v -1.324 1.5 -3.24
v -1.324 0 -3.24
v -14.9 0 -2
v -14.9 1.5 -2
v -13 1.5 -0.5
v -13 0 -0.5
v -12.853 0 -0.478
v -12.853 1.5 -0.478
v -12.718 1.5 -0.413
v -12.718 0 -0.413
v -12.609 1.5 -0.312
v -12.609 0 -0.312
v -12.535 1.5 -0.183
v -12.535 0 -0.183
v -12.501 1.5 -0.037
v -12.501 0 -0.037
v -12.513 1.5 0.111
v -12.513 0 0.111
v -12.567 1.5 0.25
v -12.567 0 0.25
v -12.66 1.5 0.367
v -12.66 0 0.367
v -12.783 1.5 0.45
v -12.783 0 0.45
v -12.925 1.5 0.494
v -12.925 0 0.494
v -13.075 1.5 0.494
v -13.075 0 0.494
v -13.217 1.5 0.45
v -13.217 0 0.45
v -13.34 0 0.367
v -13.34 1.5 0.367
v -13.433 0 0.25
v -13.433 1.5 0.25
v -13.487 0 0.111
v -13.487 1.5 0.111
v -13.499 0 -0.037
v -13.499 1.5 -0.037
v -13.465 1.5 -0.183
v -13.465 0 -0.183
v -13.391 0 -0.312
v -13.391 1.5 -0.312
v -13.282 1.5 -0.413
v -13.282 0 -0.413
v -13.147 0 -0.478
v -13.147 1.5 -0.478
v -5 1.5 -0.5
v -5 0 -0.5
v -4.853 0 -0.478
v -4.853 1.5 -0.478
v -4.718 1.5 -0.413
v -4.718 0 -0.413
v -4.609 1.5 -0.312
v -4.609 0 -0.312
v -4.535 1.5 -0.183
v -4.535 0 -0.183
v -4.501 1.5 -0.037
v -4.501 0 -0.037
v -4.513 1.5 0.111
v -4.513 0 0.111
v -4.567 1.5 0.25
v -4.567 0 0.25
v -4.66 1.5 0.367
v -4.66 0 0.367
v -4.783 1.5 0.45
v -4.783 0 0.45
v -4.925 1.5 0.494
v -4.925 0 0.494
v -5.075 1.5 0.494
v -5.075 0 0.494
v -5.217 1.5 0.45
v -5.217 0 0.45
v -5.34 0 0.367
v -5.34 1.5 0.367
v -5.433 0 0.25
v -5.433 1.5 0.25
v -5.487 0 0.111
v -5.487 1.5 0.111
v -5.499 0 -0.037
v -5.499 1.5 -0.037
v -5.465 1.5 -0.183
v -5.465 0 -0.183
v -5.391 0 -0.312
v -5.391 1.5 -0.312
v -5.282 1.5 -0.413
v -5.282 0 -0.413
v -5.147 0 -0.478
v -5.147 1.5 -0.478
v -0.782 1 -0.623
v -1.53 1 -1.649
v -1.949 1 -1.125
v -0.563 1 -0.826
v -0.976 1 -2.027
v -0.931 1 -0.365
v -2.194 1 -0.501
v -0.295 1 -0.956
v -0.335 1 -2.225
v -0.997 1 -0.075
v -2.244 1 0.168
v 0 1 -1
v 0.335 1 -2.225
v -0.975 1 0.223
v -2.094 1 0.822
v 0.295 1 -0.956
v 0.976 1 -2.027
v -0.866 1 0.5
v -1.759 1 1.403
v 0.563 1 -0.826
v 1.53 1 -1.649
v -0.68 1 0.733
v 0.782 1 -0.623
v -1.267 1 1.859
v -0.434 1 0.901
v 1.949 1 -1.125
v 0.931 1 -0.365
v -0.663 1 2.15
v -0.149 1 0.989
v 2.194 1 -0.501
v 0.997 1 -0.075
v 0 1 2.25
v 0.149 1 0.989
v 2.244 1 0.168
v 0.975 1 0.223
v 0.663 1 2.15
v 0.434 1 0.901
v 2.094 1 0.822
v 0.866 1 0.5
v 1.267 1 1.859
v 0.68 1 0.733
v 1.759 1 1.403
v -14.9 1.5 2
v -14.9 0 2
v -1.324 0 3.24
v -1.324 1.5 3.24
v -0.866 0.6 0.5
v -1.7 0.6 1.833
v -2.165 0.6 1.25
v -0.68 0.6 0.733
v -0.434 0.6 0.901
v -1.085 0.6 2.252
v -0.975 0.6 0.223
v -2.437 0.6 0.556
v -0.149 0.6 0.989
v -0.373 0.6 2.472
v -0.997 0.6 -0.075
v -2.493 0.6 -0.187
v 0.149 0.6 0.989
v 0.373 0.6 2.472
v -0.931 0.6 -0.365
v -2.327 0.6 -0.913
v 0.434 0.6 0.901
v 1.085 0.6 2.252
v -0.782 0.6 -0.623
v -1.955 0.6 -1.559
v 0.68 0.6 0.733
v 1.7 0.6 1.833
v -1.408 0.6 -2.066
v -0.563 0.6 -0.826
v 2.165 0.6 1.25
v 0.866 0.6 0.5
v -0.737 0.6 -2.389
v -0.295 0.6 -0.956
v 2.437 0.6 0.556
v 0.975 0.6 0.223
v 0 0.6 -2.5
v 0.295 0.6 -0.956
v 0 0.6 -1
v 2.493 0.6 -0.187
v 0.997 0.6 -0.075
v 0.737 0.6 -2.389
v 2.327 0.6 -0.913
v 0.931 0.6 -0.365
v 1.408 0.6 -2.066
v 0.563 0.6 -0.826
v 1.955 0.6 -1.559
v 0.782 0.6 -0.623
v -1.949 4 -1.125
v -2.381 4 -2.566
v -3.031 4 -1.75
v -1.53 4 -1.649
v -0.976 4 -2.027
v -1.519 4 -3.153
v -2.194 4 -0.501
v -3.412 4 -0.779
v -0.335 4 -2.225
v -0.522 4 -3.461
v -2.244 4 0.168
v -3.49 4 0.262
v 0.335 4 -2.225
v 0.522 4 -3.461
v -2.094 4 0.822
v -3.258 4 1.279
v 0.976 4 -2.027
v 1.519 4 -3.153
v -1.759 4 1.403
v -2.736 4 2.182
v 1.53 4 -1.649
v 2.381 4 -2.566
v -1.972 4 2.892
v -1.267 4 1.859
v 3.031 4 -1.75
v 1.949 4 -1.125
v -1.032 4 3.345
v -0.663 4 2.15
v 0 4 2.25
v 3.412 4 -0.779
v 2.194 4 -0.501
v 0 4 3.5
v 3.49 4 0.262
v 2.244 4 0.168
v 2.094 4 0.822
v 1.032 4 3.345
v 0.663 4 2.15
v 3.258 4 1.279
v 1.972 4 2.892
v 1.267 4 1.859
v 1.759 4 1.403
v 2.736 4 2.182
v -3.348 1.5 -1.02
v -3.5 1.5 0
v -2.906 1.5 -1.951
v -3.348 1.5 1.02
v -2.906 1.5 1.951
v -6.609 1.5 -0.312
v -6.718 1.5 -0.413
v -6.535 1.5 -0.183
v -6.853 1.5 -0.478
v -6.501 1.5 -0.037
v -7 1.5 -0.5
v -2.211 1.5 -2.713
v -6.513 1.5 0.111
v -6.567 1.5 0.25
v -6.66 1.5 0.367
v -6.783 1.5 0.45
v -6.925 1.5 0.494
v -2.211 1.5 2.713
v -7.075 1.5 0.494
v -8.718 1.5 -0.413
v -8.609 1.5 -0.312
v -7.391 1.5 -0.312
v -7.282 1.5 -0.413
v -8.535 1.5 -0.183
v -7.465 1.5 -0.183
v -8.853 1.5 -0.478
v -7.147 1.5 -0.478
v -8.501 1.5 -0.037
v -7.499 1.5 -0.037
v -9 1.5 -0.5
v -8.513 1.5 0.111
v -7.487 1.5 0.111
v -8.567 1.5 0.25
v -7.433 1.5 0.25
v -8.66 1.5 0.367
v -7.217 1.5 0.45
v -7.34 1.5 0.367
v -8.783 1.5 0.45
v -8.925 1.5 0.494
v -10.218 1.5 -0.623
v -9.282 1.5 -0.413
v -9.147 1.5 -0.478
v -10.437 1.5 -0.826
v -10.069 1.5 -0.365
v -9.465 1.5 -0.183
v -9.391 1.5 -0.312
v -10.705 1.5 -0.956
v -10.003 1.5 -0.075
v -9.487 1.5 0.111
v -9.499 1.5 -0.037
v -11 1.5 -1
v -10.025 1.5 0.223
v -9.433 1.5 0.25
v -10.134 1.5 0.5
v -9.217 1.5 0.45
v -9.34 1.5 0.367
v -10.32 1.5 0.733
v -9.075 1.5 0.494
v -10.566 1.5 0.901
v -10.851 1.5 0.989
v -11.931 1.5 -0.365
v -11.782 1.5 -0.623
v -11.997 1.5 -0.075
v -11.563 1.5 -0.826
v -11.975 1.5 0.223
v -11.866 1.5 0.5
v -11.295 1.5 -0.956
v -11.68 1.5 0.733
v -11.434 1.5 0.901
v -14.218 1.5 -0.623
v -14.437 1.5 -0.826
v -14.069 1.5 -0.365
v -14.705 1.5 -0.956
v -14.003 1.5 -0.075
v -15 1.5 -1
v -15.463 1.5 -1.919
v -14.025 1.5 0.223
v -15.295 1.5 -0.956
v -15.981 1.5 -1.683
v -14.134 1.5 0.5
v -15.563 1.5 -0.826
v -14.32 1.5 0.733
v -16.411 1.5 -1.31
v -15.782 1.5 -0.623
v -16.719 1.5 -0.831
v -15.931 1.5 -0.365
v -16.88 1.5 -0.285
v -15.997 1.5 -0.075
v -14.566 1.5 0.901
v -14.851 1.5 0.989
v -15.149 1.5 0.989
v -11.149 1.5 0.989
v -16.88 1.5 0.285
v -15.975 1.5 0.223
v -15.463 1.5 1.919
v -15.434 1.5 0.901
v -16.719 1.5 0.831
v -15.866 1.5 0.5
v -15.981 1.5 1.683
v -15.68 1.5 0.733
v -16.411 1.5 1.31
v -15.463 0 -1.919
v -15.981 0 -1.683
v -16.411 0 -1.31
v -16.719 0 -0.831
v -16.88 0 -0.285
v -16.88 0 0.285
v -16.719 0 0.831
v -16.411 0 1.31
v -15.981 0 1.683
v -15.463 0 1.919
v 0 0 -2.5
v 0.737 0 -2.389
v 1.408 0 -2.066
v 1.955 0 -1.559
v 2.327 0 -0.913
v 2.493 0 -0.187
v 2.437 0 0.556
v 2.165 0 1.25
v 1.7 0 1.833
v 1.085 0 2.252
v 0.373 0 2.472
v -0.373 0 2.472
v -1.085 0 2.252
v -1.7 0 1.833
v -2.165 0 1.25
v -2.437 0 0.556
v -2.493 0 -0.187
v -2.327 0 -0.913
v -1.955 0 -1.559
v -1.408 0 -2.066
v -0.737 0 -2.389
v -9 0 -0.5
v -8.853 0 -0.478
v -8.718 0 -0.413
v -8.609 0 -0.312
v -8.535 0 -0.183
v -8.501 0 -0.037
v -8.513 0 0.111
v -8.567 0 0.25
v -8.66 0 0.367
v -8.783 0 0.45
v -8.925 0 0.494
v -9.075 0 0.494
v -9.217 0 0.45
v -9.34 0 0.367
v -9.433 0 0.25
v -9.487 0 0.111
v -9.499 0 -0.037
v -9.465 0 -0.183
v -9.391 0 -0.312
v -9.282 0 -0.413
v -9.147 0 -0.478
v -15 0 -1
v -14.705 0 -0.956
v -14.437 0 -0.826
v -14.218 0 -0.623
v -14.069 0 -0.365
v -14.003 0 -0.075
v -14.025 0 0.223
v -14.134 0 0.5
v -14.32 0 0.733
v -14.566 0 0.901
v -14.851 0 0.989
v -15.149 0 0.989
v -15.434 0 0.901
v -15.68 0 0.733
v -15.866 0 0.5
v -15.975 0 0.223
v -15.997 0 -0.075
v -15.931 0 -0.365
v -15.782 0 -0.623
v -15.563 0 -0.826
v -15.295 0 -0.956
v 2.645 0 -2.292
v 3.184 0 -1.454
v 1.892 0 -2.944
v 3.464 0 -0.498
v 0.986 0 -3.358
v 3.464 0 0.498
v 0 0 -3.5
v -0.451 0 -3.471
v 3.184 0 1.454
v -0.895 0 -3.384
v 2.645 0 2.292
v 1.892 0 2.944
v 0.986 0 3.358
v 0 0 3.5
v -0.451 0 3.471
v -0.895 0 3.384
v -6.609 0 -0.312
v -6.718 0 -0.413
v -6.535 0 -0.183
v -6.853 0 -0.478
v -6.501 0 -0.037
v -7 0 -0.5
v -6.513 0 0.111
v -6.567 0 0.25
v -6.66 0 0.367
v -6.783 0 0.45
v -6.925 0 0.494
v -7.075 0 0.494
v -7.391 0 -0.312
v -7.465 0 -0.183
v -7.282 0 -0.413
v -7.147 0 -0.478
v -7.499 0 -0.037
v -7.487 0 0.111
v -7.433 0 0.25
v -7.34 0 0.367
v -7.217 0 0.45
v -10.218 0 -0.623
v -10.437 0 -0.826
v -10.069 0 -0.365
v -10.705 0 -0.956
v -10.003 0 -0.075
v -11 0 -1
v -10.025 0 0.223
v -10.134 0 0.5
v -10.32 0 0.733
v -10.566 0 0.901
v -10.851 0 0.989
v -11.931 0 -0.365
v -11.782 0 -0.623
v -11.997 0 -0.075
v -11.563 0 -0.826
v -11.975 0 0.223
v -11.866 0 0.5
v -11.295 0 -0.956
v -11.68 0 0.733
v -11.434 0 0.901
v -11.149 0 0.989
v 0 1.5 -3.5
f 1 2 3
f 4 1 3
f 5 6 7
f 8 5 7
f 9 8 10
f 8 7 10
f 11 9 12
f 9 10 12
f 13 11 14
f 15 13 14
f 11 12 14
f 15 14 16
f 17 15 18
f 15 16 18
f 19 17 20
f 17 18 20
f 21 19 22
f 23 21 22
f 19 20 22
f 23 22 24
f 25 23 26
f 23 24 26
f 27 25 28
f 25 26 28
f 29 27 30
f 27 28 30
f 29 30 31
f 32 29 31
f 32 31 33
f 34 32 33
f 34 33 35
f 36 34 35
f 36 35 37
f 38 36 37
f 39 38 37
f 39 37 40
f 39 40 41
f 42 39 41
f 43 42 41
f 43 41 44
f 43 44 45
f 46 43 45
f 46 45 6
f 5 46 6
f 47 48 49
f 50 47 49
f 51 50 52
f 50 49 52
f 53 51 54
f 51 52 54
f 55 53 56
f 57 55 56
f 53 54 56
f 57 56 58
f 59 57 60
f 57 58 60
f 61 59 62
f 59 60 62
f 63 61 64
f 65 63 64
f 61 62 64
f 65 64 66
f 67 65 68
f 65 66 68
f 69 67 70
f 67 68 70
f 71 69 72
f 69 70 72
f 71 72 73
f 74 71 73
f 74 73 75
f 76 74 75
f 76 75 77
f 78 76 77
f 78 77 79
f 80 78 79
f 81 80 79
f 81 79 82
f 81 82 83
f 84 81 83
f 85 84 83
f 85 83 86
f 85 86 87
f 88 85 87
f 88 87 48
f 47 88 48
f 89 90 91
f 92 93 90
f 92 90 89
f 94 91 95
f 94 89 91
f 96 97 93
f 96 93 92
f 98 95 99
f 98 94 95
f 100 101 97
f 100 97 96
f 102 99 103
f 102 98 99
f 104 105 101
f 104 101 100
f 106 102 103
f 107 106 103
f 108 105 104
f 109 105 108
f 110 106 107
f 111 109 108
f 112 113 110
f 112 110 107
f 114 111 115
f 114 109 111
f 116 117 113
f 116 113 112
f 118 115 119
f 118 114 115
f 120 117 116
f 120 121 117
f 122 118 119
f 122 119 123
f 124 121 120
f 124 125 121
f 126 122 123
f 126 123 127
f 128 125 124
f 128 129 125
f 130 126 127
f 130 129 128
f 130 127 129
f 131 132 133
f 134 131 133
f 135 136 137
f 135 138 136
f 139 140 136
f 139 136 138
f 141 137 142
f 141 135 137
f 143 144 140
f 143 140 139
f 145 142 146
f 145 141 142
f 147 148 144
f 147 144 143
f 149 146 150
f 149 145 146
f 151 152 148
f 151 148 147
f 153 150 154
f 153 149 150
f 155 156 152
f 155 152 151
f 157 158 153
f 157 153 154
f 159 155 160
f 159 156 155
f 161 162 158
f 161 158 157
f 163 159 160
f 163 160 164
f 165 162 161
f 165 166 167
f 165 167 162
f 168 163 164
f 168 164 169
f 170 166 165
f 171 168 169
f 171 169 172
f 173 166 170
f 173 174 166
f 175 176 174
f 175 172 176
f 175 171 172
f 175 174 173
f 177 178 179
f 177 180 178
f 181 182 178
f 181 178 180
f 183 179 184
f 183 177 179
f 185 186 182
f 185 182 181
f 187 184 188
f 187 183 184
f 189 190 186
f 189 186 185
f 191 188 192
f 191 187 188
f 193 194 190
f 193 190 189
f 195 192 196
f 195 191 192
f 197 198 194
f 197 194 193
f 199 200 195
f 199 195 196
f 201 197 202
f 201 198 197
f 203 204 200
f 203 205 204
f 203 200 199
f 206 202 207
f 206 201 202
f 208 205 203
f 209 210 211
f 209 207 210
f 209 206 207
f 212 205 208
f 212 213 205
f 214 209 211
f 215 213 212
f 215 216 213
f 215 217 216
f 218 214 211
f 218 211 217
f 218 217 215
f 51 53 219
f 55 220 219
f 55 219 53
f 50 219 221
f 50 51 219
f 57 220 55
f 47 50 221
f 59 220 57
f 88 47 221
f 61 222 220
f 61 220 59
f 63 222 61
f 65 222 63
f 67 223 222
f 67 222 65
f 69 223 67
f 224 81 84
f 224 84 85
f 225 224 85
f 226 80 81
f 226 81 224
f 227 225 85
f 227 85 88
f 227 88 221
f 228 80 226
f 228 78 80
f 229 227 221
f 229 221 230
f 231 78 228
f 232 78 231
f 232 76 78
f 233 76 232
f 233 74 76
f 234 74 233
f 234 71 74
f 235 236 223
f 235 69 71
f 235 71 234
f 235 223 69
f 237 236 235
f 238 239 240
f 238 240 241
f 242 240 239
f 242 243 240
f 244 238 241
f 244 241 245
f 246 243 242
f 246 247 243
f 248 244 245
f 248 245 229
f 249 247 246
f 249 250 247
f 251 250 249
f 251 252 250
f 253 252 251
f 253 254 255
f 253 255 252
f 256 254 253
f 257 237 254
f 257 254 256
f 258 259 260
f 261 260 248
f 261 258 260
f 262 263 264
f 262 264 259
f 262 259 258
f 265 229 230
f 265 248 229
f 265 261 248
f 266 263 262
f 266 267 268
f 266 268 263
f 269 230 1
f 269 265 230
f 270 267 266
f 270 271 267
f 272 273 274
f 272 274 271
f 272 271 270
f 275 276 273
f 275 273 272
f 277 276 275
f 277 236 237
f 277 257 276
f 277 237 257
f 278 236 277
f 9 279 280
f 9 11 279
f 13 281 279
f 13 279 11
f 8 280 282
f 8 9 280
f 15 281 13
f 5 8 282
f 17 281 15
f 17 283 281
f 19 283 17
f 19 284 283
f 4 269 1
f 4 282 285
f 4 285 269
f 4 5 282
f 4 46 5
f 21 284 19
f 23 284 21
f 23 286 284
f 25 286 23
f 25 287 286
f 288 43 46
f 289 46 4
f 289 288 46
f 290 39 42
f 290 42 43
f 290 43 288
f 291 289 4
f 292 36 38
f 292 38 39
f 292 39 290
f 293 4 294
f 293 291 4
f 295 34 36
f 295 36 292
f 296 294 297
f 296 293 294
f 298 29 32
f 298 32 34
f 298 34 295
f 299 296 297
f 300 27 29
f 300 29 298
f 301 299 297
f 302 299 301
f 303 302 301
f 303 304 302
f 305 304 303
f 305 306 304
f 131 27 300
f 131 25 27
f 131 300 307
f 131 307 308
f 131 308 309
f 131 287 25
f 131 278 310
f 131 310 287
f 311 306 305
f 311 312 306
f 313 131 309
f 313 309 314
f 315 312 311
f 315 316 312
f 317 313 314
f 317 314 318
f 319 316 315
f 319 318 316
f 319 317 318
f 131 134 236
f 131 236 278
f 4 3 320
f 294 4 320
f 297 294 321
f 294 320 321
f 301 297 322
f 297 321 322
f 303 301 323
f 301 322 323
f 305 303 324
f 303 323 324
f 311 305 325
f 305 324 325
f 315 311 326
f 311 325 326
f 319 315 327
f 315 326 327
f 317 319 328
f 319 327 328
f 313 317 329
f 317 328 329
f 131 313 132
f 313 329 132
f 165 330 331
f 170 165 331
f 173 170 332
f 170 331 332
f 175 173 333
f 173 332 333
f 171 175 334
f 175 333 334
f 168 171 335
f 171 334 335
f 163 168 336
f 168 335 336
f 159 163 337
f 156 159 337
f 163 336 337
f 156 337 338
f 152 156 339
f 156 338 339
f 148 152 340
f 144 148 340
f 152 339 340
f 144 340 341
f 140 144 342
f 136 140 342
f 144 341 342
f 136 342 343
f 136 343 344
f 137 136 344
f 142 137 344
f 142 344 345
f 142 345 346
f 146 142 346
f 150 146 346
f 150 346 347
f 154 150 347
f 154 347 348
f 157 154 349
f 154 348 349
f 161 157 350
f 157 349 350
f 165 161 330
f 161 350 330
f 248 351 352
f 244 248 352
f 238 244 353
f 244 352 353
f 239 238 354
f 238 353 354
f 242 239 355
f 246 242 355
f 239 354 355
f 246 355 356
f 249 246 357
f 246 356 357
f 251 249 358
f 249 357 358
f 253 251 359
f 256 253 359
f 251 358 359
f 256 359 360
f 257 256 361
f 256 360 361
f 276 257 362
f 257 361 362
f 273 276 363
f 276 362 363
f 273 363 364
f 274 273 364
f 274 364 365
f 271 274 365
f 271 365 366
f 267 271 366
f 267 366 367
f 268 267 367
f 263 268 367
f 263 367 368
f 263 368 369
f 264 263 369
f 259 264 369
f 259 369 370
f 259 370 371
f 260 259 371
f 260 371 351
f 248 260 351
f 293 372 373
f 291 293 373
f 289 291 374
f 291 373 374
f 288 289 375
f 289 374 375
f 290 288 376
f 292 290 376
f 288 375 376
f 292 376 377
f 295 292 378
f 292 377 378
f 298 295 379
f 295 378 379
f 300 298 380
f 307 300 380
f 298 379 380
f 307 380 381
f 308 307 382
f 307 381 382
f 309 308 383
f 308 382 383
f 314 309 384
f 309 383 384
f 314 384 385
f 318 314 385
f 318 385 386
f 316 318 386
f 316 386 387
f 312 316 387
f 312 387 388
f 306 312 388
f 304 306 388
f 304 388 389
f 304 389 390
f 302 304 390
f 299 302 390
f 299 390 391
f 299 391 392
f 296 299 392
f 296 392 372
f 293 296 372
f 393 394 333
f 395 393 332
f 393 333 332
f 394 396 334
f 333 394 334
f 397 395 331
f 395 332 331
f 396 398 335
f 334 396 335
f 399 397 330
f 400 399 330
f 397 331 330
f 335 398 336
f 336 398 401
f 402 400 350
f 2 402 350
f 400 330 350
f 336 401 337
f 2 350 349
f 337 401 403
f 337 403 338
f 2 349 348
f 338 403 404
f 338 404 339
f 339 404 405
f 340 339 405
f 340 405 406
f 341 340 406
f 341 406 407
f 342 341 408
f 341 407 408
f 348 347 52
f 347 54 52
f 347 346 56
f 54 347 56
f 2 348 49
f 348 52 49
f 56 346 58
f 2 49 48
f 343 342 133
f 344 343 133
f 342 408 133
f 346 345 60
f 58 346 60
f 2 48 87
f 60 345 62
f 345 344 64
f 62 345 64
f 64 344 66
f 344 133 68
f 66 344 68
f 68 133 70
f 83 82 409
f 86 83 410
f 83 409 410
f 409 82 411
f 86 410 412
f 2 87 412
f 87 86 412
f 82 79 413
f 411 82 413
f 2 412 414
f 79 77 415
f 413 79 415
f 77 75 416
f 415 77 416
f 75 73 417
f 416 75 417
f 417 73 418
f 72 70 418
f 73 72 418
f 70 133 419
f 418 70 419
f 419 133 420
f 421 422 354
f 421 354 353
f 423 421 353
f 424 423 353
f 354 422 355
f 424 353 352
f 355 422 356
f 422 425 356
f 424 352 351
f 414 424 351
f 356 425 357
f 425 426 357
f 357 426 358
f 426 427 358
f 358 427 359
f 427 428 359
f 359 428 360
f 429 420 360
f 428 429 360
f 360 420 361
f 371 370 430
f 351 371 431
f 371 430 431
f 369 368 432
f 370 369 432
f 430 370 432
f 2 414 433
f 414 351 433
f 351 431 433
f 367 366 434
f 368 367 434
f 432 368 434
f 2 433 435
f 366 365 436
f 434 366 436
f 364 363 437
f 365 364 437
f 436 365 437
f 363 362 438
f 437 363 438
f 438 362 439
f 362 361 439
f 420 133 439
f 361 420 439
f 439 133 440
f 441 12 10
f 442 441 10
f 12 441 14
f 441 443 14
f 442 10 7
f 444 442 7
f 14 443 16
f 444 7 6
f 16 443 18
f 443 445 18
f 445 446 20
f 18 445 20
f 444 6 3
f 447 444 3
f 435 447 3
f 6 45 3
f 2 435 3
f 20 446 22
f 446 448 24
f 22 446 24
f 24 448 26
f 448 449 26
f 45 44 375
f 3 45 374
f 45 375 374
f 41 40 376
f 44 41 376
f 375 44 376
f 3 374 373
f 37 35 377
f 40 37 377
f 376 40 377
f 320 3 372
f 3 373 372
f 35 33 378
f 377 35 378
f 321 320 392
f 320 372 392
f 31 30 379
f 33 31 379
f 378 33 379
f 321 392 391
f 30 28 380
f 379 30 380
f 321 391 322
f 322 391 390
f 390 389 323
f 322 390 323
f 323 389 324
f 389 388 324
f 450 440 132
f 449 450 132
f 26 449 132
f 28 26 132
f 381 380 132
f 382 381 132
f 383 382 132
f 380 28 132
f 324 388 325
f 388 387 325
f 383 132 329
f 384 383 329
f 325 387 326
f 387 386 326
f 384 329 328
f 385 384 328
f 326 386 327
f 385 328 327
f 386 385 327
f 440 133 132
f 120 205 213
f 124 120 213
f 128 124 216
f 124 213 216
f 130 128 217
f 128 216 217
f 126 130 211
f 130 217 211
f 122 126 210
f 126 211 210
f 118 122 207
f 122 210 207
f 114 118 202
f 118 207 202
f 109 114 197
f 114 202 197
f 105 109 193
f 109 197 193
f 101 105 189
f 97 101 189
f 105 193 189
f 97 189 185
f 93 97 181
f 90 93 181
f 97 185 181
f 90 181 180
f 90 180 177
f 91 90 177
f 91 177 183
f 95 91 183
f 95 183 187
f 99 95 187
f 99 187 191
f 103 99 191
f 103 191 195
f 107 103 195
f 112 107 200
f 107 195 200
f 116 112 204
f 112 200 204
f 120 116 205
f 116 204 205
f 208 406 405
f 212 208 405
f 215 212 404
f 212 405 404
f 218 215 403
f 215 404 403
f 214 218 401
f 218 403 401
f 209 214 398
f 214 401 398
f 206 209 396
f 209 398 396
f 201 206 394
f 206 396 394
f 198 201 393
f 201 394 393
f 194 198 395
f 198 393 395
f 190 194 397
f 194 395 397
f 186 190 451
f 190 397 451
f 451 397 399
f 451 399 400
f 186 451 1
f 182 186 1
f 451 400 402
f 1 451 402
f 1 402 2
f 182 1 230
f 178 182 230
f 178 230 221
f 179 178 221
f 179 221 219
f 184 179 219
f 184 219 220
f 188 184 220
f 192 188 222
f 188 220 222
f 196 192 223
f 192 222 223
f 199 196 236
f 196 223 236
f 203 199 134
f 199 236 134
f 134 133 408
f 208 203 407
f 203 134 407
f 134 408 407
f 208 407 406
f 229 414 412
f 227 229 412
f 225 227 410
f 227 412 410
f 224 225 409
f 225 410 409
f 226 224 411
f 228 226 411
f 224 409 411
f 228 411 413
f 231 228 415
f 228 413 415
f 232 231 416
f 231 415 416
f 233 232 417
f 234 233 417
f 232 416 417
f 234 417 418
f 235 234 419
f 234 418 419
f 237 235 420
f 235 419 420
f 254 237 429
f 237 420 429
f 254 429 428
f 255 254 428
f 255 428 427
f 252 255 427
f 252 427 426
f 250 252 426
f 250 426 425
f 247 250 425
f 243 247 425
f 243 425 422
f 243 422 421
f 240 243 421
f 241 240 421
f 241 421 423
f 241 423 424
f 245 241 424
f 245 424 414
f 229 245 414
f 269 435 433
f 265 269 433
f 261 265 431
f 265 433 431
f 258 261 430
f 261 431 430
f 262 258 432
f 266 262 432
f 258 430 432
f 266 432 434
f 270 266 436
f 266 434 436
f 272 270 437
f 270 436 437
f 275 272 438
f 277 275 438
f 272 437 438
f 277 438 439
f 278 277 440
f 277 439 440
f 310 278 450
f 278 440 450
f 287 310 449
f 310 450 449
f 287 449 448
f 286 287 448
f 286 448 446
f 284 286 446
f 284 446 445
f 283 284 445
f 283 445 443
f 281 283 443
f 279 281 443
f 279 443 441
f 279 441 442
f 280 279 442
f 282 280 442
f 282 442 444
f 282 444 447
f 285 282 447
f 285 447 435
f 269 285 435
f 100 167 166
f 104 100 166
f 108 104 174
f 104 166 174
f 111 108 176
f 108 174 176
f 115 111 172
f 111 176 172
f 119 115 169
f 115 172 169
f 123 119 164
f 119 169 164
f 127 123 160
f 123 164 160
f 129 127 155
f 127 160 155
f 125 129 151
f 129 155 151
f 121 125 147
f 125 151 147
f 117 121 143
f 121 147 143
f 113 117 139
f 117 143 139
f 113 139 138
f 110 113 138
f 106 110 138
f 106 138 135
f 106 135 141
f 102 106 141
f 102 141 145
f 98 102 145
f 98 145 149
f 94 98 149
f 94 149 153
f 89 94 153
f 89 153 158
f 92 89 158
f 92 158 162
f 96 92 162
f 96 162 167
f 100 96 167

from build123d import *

# Parameters (mm, degrees)
SKETCH1_R           = 3.5
BOSS_EXTRUDE1_DEPTH = 4
BOSS_EXTRUDE2_DEPTH = 1.5
SKETCH7_R           = 2.5
CUT_EXTRUDE4_DEPTH  = 0.6
SKETCH8_R           = 2.25
CUT_EXTRUDE5_DEPTH  = 3
SKETCH9_R           = 1
CUT_EXTRUDE6_DEPTH  = 18.590338257
SKETCH10_R          = 1
SKETCH10_R_2        = 0.5
CUT_EXTRUDE7_DEPTH  = 18.716094378


with BuildPart() as part:
    # Sketch1 → Boss-Extrude1 (new body)
    with BuildSketch(Plane(origin=(0, 0, 0), x_dir=(1, 0, 0), z_dir=(0, 1, 0))):
        with Locations(Location((0, 0, 0), (0, 0, 270))):
            Circle(SKETCH1_R)
    extrude(amount=BOSS_EXTRUDE1_DEPTH)

    # Sketch6 → Boss-Extrude2 (add)
    with BuildSketch(Plane.XZ):
        with BuildLine():
            Line((-14.9, 2), (-0.65, 3.301402389))
            Line((-0.65, 3.301402389), (0, 3.5))
            Line((0, 3.5), (0, -3.5))
            Line((0, -3.5), (-0.65, -3.301402389))
            Line((-0.65, -3.301402389), (-14.9, -2))
            ThreePointArc((-14.9, -2), (-16.9, 0), (-14.9, 2))
        make_face()
    extrude(amount=-BOSS_EXTRUDE2_DEPTH)

    # Sketch7 → Cut-Extrude4 (cut)
    with BuildSketch(Plane.XZ):
        with Locations(Location((0, 0, 0), (0, 0, 270))):
            Circle(SKETCH7_R)
    extrude(amount=-CUT_EXTRUDE4_DEPTH, mode=Mode.SUBTRACT)

    # Sketch8 → Cut-Extrude5 (cut)
    with BuildSketch(Plane(origin=(0, 4, 0), x_dir=(1, 0, 0), z_dir=(0, 1, 0))):
        with Locations(Location((0, 0, 0), (0, 0, 270))):
            Circle(SKETCH8_R)
    extrude(amount=-CUT_EXTRUDE5_DEPTH, mode=Mode.SUBTRACT)

    # Sketch9 → Cut-Extrude6 (cut, through all)
    with BuildSketch(Plane.XZ.offset(-0.6)):
        with Locations(Location((0, 0, 0), (0, 0, 270))):
            Circle(SKETCH9_R)
    extrude(amount=-CUT_EXTRUDE6_DEPTH, mode=Mode.SUBTRACT)

    # Sketch10 → Cut-Extrude7 (cut, through all)
    with BuildSketch(Plane.XZ):
        with Locations(Location((-15, 0, 0), (0, 0, 270))):
            Circle(SKETCH10_R)
        with Locations(Location((-13, 0, 0), (0, 0, 270))):
            Circle(SKETCH10_R_2)
        with Locations(Location((-11, 0, 0), (0, 0, 270))):
            Circle(SKETCH10_R)
        with Locations(Location((-9, 0, 0), (0, 0, 270))):
            Circle(SKETCH10_R_2)
        with Locations(Location((-7, 0, 0), (0, 0, 270))):
            Circle(SKETCH10_R_2)
        with Locations(Location((-5, 0, 0), (0, 0, 270))):
            Circle(SKETCH10_R_2)
    extrude(amount=-CUT_EXTRUDE7_DEPTH, mode=Mode.SUBTRACT)


solid = part.part
